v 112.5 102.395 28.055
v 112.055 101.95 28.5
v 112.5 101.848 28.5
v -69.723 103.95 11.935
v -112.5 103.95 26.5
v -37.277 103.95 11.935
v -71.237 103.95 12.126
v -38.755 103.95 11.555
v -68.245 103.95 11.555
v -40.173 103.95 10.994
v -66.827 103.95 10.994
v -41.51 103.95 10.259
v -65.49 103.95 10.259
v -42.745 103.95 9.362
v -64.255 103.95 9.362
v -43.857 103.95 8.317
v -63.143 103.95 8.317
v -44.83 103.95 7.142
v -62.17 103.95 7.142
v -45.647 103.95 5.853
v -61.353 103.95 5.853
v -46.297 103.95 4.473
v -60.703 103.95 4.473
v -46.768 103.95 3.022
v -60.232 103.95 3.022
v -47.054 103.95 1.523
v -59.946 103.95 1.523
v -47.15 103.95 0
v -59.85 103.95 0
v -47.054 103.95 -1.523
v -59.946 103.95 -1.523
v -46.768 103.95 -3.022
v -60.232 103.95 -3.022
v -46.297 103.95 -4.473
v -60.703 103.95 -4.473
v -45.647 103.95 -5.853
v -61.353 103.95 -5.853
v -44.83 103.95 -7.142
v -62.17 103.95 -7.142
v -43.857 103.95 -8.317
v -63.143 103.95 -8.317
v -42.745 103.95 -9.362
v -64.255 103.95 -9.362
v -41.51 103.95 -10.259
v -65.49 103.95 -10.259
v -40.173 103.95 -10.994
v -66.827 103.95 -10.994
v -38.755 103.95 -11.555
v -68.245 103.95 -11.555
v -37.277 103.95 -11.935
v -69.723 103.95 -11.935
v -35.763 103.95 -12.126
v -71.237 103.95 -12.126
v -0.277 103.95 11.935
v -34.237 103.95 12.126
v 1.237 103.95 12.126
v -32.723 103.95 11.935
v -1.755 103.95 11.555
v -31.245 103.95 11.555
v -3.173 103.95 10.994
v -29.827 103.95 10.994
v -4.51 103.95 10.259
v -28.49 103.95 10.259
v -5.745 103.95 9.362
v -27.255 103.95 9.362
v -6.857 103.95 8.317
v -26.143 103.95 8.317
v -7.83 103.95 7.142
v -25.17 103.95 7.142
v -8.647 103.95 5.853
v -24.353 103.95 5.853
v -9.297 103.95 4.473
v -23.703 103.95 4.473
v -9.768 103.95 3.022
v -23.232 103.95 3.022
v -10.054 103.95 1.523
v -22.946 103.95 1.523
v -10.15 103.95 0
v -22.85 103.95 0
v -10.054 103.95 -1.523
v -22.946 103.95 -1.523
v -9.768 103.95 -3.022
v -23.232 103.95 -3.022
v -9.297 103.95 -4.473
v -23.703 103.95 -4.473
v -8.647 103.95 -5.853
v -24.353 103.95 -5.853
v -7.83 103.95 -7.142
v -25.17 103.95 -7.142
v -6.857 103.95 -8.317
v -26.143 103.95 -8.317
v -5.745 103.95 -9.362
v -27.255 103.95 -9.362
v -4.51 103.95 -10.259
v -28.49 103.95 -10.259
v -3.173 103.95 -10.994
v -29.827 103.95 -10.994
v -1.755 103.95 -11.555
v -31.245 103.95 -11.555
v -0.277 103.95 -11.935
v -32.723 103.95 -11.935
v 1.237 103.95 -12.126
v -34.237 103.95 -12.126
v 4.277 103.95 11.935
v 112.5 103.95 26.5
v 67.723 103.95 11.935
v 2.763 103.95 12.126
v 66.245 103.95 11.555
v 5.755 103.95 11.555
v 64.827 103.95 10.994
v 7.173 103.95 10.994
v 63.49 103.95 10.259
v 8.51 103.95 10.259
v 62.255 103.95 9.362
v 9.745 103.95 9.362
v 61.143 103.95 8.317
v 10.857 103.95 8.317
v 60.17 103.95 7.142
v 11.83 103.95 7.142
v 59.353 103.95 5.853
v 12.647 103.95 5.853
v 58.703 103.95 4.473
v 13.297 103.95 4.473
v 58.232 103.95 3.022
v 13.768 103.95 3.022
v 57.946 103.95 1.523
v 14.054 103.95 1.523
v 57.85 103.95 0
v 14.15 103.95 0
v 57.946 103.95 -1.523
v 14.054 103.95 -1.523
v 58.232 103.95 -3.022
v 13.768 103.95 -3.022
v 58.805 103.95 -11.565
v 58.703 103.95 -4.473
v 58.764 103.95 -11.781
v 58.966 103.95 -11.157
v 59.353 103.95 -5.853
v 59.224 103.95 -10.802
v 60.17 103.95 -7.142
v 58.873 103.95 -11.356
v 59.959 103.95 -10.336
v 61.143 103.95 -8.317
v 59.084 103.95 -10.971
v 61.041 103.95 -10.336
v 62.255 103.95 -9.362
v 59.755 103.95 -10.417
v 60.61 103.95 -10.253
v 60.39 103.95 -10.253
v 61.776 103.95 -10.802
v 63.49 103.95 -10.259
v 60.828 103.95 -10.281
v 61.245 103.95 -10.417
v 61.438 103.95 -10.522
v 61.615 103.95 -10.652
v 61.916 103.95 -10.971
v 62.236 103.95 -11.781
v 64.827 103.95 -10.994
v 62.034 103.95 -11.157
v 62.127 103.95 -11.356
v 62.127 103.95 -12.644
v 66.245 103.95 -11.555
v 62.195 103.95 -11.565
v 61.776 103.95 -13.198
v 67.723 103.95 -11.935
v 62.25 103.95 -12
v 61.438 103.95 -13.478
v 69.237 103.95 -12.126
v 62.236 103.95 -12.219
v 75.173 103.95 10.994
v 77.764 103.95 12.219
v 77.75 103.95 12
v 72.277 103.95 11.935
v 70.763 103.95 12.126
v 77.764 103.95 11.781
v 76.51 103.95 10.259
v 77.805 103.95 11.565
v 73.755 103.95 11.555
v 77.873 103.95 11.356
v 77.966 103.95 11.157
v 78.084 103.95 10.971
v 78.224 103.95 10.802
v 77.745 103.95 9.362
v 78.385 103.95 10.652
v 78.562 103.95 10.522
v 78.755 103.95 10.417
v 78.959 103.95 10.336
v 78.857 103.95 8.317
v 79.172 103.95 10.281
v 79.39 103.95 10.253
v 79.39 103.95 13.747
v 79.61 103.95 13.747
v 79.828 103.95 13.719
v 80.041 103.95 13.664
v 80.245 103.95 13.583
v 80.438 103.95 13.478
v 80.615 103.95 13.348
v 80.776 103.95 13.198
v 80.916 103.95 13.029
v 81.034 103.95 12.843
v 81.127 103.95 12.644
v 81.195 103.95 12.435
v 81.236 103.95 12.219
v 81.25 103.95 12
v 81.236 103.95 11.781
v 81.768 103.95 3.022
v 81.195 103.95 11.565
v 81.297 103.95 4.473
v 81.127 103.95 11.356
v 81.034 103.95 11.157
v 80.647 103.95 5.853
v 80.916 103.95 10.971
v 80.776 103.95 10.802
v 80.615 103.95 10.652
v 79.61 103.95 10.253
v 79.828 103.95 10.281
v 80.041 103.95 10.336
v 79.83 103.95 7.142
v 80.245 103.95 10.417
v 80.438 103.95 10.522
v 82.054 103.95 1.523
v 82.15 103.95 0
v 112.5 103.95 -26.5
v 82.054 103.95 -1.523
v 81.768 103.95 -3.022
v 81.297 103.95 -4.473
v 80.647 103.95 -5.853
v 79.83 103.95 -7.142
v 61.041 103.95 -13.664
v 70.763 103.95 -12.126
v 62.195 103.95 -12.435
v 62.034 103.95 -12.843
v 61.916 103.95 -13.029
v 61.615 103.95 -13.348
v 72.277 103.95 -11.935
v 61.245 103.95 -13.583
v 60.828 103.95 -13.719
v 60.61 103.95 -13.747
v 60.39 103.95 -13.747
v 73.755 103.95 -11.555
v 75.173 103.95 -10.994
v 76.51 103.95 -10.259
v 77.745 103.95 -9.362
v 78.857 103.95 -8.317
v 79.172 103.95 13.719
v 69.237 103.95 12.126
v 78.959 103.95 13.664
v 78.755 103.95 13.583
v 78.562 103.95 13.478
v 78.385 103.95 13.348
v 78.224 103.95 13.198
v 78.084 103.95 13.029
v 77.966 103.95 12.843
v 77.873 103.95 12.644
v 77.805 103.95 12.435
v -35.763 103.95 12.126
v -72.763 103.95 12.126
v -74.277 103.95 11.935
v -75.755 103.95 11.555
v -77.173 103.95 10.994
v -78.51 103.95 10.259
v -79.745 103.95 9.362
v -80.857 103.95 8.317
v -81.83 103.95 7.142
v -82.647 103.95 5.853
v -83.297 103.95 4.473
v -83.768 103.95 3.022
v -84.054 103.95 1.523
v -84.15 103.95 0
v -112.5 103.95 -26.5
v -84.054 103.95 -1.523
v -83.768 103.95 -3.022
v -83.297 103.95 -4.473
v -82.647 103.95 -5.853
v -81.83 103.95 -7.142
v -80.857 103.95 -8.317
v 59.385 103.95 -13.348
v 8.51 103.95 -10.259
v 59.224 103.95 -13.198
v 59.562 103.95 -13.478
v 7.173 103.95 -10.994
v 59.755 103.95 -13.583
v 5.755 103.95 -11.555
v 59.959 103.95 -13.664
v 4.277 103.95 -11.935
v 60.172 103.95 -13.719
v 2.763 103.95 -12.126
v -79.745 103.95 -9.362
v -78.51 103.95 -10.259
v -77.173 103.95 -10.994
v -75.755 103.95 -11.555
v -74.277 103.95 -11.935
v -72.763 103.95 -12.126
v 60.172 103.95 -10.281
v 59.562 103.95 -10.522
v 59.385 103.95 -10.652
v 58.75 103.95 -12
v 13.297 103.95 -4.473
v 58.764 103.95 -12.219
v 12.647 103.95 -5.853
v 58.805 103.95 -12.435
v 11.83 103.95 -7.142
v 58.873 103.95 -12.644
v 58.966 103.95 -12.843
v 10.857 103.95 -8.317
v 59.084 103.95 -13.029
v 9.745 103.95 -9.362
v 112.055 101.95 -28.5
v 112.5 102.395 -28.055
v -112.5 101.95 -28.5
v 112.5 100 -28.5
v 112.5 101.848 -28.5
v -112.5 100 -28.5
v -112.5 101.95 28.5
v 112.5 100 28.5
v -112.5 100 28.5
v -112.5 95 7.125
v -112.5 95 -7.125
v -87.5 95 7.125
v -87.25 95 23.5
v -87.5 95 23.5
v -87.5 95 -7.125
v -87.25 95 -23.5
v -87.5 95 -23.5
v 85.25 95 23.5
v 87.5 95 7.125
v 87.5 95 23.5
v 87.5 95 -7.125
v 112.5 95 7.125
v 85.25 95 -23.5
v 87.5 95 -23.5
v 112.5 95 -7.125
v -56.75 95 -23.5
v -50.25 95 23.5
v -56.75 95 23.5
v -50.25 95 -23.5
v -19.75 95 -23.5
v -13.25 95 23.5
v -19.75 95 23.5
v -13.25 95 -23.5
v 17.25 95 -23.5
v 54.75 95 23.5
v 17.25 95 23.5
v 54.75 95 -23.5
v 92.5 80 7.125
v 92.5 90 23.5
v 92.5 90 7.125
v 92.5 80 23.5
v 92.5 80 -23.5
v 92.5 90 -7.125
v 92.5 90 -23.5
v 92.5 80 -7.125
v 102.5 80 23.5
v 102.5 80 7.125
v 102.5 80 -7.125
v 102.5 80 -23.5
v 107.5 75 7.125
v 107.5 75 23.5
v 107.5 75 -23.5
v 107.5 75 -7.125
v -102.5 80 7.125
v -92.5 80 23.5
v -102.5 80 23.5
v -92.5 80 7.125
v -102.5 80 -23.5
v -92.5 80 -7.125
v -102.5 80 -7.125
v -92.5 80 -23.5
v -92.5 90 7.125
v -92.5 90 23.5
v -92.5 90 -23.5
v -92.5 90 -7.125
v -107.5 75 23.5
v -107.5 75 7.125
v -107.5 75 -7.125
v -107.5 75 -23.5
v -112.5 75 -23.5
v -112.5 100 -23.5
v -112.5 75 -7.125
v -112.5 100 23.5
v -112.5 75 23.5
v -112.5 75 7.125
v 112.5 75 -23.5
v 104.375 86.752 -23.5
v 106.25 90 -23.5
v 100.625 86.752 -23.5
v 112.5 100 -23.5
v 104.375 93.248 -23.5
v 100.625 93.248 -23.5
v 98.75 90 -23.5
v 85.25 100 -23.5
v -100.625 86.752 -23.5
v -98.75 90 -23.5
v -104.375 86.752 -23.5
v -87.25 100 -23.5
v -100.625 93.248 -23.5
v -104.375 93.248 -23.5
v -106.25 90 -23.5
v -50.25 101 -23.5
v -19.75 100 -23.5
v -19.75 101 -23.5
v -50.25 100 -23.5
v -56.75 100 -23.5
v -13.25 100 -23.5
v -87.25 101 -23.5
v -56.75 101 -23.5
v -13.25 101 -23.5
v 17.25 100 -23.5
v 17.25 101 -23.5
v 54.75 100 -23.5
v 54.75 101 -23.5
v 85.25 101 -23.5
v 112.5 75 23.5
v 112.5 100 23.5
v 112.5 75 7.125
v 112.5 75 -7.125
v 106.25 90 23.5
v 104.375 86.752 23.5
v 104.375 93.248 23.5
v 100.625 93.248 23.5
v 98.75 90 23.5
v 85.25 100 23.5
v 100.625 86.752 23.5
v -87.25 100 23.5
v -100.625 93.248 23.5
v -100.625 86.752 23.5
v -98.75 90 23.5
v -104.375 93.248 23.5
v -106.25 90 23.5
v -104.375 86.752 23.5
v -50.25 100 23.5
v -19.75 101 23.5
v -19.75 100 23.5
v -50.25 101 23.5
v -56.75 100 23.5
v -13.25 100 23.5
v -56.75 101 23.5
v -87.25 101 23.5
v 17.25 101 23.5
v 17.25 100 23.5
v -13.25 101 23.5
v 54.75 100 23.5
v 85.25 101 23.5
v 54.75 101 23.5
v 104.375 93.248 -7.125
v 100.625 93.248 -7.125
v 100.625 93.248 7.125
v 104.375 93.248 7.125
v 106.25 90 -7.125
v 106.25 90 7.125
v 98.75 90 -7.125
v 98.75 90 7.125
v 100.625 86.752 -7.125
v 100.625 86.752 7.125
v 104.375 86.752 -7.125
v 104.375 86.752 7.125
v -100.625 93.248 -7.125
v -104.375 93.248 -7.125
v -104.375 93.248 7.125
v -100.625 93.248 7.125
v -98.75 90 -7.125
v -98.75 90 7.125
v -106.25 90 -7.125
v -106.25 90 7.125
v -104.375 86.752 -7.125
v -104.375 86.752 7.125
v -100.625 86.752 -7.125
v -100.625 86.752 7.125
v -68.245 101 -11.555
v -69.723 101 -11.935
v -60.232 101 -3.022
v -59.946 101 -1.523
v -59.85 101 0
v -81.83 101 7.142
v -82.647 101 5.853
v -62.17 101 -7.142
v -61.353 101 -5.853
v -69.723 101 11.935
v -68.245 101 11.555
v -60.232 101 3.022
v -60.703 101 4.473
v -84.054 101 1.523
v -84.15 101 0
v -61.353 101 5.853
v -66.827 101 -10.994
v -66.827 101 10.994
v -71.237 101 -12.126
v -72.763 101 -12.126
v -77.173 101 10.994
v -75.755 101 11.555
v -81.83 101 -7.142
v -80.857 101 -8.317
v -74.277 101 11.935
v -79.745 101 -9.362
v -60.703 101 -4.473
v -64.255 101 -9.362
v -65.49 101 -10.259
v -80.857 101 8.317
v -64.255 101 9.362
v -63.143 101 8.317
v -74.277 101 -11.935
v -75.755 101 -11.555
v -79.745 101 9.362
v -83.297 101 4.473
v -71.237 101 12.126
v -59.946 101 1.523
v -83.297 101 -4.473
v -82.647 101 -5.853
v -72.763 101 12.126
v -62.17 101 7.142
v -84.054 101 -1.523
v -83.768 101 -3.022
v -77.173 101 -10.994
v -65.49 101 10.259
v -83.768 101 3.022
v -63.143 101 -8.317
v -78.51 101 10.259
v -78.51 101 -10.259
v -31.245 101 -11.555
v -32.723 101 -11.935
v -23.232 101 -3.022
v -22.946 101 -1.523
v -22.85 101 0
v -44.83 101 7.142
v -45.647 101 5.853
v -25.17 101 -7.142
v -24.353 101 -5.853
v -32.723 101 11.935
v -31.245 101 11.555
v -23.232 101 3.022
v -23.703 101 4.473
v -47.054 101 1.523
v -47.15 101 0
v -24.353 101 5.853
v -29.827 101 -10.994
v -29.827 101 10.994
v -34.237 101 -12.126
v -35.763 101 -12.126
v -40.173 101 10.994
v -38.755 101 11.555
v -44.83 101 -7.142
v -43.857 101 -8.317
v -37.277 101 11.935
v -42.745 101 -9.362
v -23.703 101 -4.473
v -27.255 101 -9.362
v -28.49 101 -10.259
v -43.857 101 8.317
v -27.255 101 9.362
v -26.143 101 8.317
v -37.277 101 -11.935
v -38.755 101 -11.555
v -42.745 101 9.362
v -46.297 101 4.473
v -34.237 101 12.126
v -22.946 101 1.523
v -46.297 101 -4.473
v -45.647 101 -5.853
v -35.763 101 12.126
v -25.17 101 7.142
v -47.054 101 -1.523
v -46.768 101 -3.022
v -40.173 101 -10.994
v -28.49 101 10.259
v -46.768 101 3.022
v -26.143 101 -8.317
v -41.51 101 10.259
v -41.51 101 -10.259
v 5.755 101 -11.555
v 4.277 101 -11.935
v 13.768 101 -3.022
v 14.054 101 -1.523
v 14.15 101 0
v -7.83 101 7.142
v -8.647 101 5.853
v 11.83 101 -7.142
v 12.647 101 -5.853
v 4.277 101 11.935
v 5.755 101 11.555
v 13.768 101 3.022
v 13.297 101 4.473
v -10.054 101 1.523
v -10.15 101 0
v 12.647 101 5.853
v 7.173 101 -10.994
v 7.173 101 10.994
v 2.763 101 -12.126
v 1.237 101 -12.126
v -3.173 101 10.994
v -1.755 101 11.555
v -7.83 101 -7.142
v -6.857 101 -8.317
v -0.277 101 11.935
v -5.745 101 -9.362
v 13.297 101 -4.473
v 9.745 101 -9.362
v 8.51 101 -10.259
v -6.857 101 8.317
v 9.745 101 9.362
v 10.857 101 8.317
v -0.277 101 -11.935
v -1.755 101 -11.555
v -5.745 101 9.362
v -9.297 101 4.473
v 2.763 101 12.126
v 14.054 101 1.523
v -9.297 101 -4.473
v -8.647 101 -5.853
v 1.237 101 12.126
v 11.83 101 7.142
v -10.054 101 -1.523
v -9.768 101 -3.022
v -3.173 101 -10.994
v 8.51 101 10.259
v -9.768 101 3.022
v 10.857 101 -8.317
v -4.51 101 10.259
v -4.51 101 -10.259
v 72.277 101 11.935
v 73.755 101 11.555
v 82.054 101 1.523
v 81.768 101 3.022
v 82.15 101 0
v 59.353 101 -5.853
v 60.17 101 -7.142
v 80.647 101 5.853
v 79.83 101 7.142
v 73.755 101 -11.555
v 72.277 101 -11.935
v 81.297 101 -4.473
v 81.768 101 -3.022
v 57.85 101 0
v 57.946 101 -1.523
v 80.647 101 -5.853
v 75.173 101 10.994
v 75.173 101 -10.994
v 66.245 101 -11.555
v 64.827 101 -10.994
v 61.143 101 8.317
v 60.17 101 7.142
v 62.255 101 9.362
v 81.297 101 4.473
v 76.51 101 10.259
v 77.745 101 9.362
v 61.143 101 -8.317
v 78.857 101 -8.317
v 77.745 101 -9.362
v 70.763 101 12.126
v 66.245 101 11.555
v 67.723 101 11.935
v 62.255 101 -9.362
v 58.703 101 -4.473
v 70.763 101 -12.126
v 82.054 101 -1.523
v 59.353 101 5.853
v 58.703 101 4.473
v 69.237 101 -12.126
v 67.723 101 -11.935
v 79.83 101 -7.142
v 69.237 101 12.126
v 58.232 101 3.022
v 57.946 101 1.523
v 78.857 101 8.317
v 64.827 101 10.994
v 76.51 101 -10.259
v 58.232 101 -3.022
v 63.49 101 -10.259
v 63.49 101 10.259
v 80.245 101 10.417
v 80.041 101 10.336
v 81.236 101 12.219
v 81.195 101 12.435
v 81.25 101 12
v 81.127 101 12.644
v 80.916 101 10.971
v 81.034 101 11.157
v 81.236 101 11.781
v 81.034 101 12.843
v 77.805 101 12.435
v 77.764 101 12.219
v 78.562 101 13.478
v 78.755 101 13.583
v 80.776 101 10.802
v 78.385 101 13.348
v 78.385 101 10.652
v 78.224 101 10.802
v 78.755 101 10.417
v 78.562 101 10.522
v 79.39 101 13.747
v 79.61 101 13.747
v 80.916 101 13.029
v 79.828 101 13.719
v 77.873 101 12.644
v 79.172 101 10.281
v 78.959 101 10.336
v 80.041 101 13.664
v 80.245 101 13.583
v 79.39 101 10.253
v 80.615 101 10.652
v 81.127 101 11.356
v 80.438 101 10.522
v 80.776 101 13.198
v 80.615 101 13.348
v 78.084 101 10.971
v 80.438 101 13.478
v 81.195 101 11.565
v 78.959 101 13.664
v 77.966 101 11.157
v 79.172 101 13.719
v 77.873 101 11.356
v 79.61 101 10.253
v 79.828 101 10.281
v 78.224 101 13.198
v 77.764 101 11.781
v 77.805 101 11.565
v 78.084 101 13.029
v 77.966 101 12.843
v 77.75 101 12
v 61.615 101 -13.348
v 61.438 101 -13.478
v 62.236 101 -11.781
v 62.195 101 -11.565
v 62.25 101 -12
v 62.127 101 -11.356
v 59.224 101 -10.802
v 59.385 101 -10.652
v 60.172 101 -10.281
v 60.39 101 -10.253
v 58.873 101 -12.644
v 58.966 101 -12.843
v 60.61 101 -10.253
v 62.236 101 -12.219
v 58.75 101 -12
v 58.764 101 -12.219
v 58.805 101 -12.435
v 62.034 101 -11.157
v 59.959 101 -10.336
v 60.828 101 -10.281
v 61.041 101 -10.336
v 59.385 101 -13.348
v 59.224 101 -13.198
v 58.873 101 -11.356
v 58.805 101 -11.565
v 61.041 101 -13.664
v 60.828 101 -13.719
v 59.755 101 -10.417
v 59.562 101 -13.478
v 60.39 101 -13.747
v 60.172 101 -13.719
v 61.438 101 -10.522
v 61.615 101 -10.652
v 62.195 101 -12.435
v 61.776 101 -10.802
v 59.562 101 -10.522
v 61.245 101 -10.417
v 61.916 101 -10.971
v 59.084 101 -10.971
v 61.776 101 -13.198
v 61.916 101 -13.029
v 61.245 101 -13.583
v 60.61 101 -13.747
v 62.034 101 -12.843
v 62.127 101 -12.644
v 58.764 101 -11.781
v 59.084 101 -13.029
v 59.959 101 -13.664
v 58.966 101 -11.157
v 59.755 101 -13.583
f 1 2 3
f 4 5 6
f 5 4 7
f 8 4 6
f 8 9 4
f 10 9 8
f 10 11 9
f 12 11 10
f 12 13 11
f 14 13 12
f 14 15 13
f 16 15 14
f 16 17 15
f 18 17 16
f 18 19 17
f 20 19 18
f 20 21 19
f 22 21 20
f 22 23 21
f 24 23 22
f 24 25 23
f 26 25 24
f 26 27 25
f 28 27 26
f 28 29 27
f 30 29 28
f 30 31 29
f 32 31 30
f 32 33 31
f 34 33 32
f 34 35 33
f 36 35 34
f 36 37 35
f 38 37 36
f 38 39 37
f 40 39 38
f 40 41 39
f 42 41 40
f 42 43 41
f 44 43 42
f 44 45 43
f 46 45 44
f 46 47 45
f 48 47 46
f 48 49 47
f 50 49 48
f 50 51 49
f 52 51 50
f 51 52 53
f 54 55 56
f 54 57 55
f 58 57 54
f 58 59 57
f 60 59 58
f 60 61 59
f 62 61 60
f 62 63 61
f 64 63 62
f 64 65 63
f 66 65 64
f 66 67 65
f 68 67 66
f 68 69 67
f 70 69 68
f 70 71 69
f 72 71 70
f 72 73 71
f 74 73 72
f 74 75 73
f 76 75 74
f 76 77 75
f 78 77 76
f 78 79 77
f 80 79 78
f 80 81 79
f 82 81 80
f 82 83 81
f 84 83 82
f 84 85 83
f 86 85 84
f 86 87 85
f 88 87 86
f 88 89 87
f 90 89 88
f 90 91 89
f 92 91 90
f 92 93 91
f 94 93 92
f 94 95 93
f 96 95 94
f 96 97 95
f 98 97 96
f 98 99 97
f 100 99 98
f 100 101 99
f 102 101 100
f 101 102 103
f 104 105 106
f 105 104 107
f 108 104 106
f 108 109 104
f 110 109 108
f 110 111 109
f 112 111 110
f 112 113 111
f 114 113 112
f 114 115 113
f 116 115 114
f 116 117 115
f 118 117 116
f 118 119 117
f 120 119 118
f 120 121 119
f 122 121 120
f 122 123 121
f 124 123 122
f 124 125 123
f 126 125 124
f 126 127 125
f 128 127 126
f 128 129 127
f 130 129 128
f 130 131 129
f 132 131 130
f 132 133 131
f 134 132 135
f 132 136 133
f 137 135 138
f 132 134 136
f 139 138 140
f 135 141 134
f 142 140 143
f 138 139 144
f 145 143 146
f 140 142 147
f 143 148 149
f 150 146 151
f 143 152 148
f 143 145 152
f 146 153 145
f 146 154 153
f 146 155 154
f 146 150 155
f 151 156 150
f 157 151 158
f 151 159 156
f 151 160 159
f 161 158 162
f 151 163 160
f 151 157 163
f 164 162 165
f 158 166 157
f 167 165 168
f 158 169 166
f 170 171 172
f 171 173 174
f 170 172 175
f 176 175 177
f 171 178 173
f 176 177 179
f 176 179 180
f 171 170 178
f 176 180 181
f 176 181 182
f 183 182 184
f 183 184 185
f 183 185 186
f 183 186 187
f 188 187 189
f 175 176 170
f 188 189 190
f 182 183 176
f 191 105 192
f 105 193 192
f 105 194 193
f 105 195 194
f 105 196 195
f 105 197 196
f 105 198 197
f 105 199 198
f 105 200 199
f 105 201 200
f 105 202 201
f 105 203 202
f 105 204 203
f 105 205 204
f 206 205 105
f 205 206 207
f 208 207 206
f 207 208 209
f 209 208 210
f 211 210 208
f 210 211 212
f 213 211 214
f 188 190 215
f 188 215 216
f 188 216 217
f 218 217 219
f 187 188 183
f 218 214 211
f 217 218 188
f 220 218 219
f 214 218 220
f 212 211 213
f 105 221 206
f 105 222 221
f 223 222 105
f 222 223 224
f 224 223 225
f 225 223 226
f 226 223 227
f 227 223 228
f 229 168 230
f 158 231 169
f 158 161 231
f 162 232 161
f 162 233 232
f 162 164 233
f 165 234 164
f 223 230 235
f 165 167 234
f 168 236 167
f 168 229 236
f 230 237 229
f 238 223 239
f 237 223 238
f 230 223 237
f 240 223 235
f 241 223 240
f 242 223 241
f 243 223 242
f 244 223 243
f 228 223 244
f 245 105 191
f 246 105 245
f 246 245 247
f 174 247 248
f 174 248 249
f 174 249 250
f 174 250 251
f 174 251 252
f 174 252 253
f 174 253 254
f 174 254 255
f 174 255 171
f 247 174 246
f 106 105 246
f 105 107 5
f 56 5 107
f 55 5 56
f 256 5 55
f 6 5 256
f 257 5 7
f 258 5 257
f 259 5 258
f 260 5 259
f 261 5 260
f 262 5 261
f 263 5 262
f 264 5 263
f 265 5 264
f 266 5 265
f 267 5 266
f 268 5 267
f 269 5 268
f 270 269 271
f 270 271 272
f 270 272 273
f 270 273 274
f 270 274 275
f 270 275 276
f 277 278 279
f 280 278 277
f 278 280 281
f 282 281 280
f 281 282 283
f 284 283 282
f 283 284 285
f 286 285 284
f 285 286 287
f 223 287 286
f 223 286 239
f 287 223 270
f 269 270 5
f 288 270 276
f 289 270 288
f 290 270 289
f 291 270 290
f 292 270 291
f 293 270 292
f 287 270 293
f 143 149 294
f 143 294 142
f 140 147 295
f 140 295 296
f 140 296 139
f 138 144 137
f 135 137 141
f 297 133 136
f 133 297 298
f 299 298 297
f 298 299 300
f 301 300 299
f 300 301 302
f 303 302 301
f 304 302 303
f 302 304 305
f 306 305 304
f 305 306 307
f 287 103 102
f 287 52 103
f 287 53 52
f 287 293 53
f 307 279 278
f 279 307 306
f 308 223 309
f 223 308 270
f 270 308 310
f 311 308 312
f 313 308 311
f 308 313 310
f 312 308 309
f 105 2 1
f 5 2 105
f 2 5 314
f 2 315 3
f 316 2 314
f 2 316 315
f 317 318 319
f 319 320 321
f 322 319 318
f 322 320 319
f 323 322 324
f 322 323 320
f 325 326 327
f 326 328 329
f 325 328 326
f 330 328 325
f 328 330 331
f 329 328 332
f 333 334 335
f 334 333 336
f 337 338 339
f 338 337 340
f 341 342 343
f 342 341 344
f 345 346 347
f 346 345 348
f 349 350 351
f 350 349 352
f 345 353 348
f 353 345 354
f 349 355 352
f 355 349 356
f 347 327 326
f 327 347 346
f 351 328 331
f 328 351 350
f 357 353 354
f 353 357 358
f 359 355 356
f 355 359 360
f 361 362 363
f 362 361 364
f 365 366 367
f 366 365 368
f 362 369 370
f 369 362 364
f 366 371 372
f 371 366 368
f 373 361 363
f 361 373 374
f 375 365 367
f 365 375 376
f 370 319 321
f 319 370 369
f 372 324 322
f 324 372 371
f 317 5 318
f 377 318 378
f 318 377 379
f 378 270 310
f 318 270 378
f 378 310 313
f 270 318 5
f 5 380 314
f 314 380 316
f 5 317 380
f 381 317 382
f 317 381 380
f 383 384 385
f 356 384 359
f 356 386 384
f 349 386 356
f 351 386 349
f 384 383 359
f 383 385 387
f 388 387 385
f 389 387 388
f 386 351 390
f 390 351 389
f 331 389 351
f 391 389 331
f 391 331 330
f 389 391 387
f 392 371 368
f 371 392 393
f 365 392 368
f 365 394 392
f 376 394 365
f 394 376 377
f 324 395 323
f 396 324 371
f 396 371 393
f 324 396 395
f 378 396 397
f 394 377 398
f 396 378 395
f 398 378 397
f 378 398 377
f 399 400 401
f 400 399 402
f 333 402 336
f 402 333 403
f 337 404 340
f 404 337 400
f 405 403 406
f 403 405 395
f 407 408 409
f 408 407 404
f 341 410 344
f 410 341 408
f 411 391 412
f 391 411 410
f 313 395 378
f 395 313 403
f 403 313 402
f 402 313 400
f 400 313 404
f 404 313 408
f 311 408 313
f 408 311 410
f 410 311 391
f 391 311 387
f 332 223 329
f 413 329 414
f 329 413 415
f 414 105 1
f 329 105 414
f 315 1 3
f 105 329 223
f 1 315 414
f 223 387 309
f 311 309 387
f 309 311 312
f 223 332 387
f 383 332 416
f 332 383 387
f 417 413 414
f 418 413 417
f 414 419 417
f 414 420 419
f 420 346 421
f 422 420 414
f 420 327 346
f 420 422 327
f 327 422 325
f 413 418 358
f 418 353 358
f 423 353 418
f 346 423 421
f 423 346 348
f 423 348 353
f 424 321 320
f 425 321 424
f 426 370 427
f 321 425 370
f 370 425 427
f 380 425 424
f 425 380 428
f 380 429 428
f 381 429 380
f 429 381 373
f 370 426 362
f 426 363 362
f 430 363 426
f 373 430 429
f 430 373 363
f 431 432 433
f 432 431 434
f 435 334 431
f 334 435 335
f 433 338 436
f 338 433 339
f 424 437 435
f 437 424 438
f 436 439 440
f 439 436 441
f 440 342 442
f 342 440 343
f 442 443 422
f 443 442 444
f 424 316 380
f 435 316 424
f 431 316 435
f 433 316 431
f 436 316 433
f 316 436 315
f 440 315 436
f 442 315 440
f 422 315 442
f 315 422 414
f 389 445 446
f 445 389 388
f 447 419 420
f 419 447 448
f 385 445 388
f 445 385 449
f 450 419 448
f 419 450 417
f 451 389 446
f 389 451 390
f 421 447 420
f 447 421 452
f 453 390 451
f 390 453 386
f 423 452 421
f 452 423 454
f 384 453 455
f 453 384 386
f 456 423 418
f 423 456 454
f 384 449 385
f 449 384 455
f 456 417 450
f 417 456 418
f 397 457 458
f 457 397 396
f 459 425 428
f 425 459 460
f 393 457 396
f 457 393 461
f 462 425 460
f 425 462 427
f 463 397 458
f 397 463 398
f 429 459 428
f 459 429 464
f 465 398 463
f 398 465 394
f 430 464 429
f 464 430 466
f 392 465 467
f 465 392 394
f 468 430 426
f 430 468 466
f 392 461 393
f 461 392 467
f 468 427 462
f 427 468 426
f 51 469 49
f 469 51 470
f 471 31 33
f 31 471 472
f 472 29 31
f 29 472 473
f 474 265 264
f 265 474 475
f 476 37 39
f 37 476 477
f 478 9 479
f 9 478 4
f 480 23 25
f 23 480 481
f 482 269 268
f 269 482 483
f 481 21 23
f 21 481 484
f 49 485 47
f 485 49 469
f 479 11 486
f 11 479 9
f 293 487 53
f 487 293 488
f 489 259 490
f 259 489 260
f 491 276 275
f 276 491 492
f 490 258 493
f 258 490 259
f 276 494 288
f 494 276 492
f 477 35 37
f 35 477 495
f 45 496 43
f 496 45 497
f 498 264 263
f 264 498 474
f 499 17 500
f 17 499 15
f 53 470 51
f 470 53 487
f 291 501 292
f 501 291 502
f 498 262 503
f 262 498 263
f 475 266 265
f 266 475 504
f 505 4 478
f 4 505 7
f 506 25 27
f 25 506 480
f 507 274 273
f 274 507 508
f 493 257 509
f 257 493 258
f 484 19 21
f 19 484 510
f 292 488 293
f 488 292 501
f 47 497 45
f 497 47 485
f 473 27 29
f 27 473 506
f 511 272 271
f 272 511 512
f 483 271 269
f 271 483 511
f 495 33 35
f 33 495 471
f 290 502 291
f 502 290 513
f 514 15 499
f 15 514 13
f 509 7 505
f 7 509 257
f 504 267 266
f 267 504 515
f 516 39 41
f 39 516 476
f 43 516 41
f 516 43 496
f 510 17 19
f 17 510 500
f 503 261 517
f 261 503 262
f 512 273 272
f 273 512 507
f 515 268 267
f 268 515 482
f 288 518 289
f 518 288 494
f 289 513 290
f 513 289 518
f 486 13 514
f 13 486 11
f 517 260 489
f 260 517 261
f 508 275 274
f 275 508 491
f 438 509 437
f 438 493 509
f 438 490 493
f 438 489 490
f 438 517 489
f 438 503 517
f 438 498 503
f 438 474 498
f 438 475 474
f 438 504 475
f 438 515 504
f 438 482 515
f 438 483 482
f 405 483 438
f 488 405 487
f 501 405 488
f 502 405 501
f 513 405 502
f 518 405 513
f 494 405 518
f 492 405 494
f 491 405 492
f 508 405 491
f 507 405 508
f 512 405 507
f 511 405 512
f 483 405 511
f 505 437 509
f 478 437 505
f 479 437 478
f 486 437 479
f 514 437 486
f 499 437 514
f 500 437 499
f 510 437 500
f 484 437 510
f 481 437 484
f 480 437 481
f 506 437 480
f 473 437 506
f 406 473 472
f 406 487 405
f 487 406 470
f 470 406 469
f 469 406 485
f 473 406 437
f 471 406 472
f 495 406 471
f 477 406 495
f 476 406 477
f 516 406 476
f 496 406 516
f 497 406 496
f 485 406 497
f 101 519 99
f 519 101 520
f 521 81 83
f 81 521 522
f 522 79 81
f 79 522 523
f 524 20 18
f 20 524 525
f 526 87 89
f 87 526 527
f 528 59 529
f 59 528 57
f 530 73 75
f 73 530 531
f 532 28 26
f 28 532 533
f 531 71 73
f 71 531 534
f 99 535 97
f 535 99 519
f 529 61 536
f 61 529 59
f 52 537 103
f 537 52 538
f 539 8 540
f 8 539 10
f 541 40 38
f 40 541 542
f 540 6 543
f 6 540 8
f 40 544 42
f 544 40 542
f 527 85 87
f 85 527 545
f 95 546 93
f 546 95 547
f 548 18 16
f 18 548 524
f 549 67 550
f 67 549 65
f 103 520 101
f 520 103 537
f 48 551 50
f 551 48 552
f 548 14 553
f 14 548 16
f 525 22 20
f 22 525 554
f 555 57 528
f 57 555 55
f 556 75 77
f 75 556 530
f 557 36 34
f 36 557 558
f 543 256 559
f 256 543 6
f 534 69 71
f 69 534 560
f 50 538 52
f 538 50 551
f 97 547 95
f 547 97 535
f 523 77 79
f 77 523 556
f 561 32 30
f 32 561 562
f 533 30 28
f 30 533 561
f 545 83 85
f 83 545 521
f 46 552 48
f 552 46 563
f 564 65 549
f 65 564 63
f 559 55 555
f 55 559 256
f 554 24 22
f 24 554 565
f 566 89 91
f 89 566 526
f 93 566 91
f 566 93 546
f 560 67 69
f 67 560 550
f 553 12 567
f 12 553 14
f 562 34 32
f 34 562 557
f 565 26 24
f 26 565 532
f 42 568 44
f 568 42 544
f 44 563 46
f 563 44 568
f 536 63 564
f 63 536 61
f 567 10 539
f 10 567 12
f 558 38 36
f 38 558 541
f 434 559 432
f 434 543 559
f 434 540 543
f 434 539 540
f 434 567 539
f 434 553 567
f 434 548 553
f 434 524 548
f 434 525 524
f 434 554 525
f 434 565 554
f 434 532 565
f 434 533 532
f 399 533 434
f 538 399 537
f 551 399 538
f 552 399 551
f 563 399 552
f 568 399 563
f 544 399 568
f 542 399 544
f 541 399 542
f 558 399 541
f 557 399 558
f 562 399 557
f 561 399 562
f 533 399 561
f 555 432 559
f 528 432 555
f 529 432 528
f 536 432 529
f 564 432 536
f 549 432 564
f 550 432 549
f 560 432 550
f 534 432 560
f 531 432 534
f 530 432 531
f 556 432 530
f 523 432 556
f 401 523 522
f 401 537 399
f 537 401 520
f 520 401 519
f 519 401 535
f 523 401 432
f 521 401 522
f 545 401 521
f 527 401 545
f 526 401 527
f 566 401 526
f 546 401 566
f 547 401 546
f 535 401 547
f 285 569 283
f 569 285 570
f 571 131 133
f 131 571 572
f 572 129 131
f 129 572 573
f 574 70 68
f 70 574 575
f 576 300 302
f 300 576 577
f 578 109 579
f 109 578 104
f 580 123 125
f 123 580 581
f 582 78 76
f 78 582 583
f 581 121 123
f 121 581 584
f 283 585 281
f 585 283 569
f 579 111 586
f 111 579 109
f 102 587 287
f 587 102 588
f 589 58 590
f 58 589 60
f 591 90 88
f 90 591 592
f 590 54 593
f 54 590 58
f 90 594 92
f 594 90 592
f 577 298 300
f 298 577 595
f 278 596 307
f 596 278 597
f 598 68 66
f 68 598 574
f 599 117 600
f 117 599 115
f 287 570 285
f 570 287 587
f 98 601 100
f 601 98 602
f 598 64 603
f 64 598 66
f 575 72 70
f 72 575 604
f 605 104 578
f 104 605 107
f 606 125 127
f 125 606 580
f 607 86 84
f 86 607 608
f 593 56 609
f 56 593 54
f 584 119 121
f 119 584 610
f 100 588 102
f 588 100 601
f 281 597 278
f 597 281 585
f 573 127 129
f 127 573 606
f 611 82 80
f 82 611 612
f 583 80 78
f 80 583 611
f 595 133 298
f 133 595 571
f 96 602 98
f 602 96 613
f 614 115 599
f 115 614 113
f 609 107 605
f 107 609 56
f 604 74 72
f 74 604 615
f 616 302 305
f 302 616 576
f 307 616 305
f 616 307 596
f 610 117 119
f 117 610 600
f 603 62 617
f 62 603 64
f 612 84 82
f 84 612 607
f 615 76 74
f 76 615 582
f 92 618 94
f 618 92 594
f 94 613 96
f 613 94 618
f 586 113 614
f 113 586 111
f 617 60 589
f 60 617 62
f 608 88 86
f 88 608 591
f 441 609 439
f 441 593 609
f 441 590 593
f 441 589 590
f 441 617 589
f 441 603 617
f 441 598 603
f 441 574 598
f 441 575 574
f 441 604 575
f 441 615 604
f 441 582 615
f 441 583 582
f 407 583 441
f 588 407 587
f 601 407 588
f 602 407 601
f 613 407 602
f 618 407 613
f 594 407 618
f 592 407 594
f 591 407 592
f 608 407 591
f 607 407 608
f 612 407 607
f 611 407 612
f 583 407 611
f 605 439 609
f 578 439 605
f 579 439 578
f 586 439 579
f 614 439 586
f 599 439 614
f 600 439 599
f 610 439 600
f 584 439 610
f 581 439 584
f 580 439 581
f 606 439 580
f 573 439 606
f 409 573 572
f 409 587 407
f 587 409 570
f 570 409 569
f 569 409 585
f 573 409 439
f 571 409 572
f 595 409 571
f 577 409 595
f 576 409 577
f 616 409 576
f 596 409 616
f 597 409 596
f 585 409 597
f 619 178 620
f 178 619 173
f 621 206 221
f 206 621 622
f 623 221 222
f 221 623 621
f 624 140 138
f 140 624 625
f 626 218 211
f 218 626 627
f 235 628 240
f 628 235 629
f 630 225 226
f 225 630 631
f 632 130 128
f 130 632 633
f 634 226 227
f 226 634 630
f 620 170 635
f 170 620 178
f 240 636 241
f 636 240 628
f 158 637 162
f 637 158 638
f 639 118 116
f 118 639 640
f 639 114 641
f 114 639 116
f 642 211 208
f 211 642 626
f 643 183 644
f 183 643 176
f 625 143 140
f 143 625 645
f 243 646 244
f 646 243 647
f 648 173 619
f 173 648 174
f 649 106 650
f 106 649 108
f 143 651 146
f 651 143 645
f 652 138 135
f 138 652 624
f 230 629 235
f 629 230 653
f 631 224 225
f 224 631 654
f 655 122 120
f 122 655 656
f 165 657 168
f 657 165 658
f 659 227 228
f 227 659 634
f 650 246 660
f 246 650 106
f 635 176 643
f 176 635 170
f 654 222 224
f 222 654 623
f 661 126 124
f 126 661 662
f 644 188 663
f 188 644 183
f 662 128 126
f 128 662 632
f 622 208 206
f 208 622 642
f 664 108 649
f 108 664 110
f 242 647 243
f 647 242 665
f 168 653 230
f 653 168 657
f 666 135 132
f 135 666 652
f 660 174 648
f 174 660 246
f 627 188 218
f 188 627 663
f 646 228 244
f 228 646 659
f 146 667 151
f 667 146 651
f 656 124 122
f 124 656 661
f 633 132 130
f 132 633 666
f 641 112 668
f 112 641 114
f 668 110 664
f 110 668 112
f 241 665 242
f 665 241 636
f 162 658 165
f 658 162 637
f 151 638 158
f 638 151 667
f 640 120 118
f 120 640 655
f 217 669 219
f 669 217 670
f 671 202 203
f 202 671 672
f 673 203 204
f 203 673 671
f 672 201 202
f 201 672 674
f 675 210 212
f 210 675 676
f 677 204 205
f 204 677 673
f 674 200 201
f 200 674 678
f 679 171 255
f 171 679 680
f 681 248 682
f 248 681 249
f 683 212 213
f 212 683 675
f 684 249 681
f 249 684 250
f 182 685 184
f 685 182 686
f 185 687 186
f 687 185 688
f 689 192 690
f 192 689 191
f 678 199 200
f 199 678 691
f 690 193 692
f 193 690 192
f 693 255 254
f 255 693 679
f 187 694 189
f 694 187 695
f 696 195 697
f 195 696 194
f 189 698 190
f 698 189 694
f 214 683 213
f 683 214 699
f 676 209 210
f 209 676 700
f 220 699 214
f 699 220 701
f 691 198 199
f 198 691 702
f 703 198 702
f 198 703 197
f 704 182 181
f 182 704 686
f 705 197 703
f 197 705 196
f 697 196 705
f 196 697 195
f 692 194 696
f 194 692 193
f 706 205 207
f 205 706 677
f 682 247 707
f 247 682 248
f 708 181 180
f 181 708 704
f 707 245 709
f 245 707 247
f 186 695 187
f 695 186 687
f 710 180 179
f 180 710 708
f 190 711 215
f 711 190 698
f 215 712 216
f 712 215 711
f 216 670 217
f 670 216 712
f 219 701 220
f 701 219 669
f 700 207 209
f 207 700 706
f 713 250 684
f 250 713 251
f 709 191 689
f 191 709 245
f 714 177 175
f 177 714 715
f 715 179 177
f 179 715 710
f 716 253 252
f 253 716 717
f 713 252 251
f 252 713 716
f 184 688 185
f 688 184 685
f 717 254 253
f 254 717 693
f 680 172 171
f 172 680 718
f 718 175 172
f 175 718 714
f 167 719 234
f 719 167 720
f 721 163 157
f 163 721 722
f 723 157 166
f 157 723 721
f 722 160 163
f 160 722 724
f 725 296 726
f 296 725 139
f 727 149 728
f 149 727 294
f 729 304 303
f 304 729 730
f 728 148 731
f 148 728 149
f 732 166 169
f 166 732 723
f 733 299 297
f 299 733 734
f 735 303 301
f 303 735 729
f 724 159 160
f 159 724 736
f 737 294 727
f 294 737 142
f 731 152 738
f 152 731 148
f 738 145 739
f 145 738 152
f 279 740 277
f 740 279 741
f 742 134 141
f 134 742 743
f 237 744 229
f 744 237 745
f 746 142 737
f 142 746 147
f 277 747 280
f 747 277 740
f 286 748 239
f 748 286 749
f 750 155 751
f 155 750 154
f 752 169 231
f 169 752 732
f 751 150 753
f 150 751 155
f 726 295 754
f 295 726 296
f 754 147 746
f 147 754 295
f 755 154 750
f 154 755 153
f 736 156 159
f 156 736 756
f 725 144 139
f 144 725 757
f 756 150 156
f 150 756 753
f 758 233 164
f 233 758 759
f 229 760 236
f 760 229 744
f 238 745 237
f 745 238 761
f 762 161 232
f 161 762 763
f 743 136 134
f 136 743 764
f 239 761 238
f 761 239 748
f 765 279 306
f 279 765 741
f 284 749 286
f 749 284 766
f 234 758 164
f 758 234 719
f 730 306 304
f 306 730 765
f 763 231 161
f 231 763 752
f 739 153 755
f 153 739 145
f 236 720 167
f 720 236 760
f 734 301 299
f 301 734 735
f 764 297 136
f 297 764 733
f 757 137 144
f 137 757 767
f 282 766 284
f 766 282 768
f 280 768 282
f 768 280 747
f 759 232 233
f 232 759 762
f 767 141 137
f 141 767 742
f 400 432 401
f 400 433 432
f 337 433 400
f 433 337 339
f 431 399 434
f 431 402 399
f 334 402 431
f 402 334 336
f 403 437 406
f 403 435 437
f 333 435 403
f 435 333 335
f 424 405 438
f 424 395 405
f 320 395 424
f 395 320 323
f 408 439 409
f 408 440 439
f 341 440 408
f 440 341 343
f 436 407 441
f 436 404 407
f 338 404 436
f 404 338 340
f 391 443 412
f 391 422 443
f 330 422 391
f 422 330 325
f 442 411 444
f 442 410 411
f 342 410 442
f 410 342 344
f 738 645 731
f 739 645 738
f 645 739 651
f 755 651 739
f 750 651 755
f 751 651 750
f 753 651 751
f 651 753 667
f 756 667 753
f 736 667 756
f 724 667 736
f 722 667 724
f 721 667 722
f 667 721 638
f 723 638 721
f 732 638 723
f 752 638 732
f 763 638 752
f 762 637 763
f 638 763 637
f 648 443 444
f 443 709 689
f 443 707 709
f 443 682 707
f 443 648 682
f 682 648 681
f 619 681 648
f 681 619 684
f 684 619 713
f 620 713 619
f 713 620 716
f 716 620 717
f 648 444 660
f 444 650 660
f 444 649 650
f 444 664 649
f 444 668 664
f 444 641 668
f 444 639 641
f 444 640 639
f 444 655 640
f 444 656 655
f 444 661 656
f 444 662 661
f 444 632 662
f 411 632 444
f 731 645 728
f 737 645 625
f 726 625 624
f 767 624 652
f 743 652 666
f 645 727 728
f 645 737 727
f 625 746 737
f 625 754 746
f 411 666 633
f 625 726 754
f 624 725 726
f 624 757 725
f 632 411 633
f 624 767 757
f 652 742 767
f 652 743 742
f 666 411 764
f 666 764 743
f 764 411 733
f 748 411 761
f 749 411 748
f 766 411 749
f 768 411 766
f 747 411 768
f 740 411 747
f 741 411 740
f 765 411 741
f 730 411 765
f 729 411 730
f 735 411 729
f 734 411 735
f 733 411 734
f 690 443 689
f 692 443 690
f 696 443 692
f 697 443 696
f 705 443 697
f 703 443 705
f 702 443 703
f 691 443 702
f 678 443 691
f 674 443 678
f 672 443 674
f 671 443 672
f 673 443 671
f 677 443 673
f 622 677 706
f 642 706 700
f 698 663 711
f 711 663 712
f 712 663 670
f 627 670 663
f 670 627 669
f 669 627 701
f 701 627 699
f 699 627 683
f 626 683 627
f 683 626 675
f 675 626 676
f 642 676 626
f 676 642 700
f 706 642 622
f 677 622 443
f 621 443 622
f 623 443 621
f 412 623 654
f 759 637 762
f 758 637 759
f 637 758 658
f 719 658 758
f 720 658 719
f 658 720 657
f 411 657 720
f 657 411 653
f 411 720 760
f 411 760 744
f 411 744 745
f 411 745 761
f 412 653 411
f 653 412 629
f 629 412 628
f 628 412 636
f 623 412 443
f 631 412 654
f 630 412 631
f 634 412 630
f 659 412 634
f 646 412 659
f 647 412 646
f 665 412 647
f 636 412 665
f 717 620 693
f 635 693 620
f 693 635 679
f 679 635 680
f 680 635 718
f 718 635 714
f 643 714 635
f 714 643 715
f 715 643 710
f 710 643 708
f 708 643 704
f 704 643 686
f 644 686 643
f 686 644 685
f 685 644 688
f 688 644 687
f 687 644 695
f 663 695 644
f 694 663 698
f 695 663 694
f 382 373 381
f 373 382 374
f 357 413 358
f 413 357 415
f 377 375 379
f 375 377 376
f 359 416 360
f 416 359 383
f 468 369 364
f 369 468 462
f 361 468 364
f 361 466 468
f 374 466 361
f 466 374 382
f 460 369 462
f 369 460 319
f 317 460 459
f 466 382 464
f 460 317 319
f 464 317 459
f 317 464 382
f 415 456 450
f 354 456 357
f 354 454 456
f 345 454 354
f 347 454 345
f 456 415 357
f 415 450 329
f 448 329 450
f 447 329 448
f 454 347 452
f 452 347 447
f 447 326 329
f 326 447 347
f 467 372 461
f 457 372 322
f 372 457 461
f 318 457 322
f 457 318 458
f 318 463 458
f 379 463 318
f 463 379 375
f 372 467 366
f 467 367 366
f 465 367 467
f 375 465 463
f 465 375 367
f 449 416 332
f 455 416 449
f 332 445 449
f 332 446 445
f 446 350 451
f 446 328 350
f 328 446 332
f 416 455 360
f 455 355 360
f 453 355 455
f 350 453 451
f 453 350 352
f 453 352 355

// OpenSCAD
// file: frame-left.scad
/*
 * SPDX-FileCopyrightText: © 2023 Brian S. Stephan <bss@incorporeal.org>
 * SPDX-License-Identifier: GPL-3.0-or-later
 */

include <parameters.scad>
include <components.scad>

module base_left_frame(lower=false) {
	difference() {
		frame(lower=lower);
		// chop the right edge off
		side_chopper();
	}
}

module left_frame(lower=false) {
	difference() {
		base_left_frame(lower=lower);
		// connection holes to other frames
		frame_connection_holes();

		// cable routing hole
		frame_cable_routing_hole();

		// aux button holes
		translate([-35, 101.5, 0]) rotate([270, 0, 0]) aux_control_three_button_cluster();
		translate([-35, (frame_y/2)-neutrik_panel_thickness-4, 0]) frame_cutout();
		translate([-72, (frame_y/2)-neutrik_panel_thickness-4, 0]) frame_cutout();
		translate([2, (frame_y/2)-neutrik_panel_thickness-4, 0]) frame_cutout();

		// neutrix button hole
		translate([frame_center_to_neutrik, (frame_y/2)-neutrik_panel_thickness, 0])
			rotate([90, 0, 0]) neutrik_d_mount();
		translate([frame_center_to_neutrik, (frame_y/2)-neutrik_panel_thickness-4, 0])
			frame_cutout();
	}
}

left_frame();
// file: parameters.scad
/*
 * SPDX-FileCopyrightText: © 2023 Brian S. Stephan <bss@incorporeal.org>
 * SPDX-License-Identifier: GPL-3.0-or-later
 */

// adjustments
hole_tolerance = 0.15;

// M2
m2_screw_selftap_radius = 0.95;

// M3
m3_screw_selftap_radius = 1.3;

// M4
m4_bolt_radius = 2 + hole_tolerance;
m4_bolt_countersink_radius = 6.1 + hole_tolerance;
m4_bolt_hex_exterior_radius = 3.6 + hole_tolerance;

// 24mm button
small_button_radius = 12 + hole_tolerance;

// 30mm button
big_button_radius = 15 + hole_tolerance;

// JLF mount dimensions
lever_mount_x = 53;
lever_mount_y = 95;
lever_mount_z = 2;

// standard lever hole
lever_plate_hole = 12;

// korean lever hole
korean_lever_plate_hole = 17.6;

// case dimensions
// base frame box. reminder: top of inside (including mounts) is chopped by panel_z for plates
frame_x = 233;
frame_y = 208;
frame_z = 57;

// degree to which the extended frame pieces stick out from the end of the frame
frame_extension_x = 25;
frame_extension_y = 25;

// this sinks the bottom and top of the frame inward a bit, and is used to math out two shapes
// when creating the frame box / overhang panel
frame_bevel_height = 2;
overhang_panel_bevel_height = 1;

frame_center_to_neutrik = 70;

// depth of the "lip" of the frame that the top plate sets into/supports the overhang
frame_wall = 4;

// width of the column in the frame corners to support the hex bolt
frame_mount_column_width = 20;

// per neutrik (mm)
neutrik_panel_thickness = 3;

// top plate, which can either be the whole plate ("inset") or the mounting frame for a plate that overhangs
panel_x = frame_x - (frame_wall * 2);
panel_y = frame_y - (frame_wall * 2);
panel_z = 5;

// how much the top plate x/y is expanded to overhang the frame
// note that this is relative to the top plate (so the wall is added back)
panel_overhang_amount = 8.5;
overhang_panel_x = panel_x + (frame_wall * 2) + (panel_overhang_amount * 2);
overhang_panel_y = panel_y + (frame_wall * 2) + (panel_overhang_amount * 2);

panel_to_frame_point_x = (panel_x/2)-10;
panel_to_frame_point_y = (panel_y/2)-10;

// frame interior that supports the top plates
panel_support_width = 5;

// neutrik D screw holes
neutrik_d_screw_radius = 1.6 + hole_tolerance;
neutrik_d_radius = 12 + hole_tolerance;

// additional button radius for decorative panels, etc.
decorative_radius_scale = 1.75;
jumbo_decorative_radius_scale = 2;
// main file
/*
 * SPDX-FileCopyrightText: © 2024 Brian S. Stephan <bss@incorporeal.org>
 * SPDX-License-Identifier: GPL-3.0-or-later
 */

include <parameters.scad>
include <components.scad>
use <frame-left.scad>

module top_left_or_right_frame_piece() {
    piece_width = panel_support_width+frame_wall+frame_mount_column_width;

	intersection() {
		left_frame();
		difference() {
			// include the whole top wall (including mount columns)
			translate([0, (frame_y/2)-(piece_width/2), 0]) cube([frame_x, piece_width, frame_z], center=true);
			// ...minus the frame wall and lip on the left
			translate([-frame_x/2+frame_wall/2, 0, 0])
				cube([frame_wall, frame_y, frame_z], center=true);
			// ...minus a slot for the combining piece to go into
			cube([frame_x, frame_y-(panel_support_width+frame_wall)*2, frame_z/4], center=true);
		}
	}
}

top_left_or_right_frame_piece();
